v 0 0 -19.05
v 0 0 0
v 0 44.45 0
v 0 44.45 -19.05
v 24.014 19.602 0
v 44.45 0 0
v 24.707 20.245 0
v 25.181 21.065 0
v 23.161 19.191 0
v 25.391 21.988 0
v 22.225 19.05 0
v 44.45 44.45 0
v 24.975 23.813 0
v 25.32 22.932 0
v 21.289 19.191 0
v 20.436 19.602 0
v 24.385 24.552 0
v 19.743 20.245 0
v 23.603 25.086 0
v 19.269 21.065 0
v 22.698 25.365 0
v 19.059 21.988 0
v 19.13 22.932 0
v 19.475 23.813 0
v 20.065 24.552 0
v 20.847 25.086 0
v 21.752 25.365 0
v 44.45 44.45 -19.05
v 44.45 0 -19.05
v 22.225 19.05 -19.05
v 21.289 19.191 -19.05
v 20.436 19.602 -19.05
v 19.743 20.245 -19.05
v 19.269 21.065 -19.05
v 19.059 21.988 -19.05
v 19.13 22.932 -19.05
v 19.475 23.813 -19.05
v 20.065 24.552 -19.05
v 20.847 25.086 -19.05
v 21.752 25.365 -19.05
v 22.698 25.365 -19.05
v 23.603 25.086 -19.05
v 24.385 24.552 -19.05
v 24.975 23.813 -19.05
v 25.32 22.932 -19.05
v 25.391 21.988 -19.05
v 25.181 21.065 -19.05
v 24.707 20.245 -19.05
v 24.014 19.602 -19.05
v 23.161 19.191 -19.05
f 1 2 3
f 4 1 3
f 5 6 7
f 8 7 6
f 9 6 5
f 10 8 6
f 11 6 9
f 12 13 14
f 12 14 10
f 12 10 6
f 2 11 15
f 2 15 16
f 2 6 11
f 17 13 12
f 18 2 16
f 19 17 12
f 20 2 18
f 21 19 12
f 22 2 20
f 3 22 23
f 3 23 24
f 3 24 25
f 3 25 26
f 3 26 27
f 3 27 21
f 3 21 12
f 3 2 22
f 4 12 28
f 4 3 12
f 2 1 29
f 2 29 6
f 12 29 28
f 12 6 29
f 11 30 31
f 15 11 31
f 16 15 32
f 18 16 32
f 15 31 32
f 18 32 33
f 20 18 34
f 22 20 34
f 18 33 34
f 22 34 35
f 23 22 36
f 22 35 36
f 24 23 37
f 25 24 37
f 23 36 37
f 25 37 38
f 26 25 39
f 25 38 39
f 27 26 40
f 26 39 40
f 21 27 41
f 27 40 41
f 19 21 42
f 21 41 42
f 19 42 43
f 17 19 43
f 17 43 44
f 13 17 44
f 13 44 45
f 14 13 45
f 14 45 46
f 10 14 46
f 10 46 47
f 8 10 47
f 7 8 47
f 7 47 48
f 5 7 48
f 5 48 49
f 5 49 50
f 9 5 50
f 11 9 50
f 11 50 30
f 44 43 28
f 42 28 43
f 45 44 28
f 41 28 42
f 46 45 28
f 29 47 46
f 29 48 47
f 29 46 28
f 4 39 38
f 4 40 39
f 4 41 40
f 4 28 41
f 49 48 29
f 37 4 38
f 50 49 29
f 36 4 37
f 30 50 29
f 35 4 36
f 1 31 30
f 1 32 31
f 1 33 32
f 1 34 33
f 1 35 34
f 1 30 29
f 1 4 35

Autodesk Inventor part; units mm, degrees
ref_plane "YZ Plane" through (0, 0, 0) normal (1, 0, 0) x (0, 1, 0)
ref_plane "XZ Plane" through (0, 0, 0) normal (0, 1, 0) x (-1, 0, 0)
ref_plane "XY Plane" through (0, 0, 0) normal (0, 0, 1) x (1, 0, 0)
sketch "Sketch1" plane through (0, 0, 0) normal (1, 0, 0) x (0, 1, 0)
  line L0 (0, 0) -> (44.45, 0)
  line L1 (44.45, 0) -> (44.45, -19.05)
  line L2 (44.45, -19.05) -> (0, -19.05)
  line L3 (0, -19.05) -> (0, 0)
  dimension "d0" = 44.45
  dimension "d1" = 19.05
extrude "Extrusion1" add sketch "Sketch1" along normal blind 44.45
sketch "Sketch2" plane through (0, 0, 0) normal (0, 0, 1) x (1, 0, 0)
  line L0 (0, 0) -> (0, 44.45) projected
  line L1 (0, 0) -> (44.45, 0) projected
  line L2 (44.45, 44.45) -> (44.45, 0) projected
  line L3 (0, 44.45) -> (44.45, 44.45) projected
  point P0 (22.225, 22.225)
  dimension "d4" = 22.225
  dimension "d5" = 22.225
hole "Hole1" at (22.225, 22.225, 0) direction (0, 0, -1) diameter 6.35 end through all
properties part number "tension_block"
